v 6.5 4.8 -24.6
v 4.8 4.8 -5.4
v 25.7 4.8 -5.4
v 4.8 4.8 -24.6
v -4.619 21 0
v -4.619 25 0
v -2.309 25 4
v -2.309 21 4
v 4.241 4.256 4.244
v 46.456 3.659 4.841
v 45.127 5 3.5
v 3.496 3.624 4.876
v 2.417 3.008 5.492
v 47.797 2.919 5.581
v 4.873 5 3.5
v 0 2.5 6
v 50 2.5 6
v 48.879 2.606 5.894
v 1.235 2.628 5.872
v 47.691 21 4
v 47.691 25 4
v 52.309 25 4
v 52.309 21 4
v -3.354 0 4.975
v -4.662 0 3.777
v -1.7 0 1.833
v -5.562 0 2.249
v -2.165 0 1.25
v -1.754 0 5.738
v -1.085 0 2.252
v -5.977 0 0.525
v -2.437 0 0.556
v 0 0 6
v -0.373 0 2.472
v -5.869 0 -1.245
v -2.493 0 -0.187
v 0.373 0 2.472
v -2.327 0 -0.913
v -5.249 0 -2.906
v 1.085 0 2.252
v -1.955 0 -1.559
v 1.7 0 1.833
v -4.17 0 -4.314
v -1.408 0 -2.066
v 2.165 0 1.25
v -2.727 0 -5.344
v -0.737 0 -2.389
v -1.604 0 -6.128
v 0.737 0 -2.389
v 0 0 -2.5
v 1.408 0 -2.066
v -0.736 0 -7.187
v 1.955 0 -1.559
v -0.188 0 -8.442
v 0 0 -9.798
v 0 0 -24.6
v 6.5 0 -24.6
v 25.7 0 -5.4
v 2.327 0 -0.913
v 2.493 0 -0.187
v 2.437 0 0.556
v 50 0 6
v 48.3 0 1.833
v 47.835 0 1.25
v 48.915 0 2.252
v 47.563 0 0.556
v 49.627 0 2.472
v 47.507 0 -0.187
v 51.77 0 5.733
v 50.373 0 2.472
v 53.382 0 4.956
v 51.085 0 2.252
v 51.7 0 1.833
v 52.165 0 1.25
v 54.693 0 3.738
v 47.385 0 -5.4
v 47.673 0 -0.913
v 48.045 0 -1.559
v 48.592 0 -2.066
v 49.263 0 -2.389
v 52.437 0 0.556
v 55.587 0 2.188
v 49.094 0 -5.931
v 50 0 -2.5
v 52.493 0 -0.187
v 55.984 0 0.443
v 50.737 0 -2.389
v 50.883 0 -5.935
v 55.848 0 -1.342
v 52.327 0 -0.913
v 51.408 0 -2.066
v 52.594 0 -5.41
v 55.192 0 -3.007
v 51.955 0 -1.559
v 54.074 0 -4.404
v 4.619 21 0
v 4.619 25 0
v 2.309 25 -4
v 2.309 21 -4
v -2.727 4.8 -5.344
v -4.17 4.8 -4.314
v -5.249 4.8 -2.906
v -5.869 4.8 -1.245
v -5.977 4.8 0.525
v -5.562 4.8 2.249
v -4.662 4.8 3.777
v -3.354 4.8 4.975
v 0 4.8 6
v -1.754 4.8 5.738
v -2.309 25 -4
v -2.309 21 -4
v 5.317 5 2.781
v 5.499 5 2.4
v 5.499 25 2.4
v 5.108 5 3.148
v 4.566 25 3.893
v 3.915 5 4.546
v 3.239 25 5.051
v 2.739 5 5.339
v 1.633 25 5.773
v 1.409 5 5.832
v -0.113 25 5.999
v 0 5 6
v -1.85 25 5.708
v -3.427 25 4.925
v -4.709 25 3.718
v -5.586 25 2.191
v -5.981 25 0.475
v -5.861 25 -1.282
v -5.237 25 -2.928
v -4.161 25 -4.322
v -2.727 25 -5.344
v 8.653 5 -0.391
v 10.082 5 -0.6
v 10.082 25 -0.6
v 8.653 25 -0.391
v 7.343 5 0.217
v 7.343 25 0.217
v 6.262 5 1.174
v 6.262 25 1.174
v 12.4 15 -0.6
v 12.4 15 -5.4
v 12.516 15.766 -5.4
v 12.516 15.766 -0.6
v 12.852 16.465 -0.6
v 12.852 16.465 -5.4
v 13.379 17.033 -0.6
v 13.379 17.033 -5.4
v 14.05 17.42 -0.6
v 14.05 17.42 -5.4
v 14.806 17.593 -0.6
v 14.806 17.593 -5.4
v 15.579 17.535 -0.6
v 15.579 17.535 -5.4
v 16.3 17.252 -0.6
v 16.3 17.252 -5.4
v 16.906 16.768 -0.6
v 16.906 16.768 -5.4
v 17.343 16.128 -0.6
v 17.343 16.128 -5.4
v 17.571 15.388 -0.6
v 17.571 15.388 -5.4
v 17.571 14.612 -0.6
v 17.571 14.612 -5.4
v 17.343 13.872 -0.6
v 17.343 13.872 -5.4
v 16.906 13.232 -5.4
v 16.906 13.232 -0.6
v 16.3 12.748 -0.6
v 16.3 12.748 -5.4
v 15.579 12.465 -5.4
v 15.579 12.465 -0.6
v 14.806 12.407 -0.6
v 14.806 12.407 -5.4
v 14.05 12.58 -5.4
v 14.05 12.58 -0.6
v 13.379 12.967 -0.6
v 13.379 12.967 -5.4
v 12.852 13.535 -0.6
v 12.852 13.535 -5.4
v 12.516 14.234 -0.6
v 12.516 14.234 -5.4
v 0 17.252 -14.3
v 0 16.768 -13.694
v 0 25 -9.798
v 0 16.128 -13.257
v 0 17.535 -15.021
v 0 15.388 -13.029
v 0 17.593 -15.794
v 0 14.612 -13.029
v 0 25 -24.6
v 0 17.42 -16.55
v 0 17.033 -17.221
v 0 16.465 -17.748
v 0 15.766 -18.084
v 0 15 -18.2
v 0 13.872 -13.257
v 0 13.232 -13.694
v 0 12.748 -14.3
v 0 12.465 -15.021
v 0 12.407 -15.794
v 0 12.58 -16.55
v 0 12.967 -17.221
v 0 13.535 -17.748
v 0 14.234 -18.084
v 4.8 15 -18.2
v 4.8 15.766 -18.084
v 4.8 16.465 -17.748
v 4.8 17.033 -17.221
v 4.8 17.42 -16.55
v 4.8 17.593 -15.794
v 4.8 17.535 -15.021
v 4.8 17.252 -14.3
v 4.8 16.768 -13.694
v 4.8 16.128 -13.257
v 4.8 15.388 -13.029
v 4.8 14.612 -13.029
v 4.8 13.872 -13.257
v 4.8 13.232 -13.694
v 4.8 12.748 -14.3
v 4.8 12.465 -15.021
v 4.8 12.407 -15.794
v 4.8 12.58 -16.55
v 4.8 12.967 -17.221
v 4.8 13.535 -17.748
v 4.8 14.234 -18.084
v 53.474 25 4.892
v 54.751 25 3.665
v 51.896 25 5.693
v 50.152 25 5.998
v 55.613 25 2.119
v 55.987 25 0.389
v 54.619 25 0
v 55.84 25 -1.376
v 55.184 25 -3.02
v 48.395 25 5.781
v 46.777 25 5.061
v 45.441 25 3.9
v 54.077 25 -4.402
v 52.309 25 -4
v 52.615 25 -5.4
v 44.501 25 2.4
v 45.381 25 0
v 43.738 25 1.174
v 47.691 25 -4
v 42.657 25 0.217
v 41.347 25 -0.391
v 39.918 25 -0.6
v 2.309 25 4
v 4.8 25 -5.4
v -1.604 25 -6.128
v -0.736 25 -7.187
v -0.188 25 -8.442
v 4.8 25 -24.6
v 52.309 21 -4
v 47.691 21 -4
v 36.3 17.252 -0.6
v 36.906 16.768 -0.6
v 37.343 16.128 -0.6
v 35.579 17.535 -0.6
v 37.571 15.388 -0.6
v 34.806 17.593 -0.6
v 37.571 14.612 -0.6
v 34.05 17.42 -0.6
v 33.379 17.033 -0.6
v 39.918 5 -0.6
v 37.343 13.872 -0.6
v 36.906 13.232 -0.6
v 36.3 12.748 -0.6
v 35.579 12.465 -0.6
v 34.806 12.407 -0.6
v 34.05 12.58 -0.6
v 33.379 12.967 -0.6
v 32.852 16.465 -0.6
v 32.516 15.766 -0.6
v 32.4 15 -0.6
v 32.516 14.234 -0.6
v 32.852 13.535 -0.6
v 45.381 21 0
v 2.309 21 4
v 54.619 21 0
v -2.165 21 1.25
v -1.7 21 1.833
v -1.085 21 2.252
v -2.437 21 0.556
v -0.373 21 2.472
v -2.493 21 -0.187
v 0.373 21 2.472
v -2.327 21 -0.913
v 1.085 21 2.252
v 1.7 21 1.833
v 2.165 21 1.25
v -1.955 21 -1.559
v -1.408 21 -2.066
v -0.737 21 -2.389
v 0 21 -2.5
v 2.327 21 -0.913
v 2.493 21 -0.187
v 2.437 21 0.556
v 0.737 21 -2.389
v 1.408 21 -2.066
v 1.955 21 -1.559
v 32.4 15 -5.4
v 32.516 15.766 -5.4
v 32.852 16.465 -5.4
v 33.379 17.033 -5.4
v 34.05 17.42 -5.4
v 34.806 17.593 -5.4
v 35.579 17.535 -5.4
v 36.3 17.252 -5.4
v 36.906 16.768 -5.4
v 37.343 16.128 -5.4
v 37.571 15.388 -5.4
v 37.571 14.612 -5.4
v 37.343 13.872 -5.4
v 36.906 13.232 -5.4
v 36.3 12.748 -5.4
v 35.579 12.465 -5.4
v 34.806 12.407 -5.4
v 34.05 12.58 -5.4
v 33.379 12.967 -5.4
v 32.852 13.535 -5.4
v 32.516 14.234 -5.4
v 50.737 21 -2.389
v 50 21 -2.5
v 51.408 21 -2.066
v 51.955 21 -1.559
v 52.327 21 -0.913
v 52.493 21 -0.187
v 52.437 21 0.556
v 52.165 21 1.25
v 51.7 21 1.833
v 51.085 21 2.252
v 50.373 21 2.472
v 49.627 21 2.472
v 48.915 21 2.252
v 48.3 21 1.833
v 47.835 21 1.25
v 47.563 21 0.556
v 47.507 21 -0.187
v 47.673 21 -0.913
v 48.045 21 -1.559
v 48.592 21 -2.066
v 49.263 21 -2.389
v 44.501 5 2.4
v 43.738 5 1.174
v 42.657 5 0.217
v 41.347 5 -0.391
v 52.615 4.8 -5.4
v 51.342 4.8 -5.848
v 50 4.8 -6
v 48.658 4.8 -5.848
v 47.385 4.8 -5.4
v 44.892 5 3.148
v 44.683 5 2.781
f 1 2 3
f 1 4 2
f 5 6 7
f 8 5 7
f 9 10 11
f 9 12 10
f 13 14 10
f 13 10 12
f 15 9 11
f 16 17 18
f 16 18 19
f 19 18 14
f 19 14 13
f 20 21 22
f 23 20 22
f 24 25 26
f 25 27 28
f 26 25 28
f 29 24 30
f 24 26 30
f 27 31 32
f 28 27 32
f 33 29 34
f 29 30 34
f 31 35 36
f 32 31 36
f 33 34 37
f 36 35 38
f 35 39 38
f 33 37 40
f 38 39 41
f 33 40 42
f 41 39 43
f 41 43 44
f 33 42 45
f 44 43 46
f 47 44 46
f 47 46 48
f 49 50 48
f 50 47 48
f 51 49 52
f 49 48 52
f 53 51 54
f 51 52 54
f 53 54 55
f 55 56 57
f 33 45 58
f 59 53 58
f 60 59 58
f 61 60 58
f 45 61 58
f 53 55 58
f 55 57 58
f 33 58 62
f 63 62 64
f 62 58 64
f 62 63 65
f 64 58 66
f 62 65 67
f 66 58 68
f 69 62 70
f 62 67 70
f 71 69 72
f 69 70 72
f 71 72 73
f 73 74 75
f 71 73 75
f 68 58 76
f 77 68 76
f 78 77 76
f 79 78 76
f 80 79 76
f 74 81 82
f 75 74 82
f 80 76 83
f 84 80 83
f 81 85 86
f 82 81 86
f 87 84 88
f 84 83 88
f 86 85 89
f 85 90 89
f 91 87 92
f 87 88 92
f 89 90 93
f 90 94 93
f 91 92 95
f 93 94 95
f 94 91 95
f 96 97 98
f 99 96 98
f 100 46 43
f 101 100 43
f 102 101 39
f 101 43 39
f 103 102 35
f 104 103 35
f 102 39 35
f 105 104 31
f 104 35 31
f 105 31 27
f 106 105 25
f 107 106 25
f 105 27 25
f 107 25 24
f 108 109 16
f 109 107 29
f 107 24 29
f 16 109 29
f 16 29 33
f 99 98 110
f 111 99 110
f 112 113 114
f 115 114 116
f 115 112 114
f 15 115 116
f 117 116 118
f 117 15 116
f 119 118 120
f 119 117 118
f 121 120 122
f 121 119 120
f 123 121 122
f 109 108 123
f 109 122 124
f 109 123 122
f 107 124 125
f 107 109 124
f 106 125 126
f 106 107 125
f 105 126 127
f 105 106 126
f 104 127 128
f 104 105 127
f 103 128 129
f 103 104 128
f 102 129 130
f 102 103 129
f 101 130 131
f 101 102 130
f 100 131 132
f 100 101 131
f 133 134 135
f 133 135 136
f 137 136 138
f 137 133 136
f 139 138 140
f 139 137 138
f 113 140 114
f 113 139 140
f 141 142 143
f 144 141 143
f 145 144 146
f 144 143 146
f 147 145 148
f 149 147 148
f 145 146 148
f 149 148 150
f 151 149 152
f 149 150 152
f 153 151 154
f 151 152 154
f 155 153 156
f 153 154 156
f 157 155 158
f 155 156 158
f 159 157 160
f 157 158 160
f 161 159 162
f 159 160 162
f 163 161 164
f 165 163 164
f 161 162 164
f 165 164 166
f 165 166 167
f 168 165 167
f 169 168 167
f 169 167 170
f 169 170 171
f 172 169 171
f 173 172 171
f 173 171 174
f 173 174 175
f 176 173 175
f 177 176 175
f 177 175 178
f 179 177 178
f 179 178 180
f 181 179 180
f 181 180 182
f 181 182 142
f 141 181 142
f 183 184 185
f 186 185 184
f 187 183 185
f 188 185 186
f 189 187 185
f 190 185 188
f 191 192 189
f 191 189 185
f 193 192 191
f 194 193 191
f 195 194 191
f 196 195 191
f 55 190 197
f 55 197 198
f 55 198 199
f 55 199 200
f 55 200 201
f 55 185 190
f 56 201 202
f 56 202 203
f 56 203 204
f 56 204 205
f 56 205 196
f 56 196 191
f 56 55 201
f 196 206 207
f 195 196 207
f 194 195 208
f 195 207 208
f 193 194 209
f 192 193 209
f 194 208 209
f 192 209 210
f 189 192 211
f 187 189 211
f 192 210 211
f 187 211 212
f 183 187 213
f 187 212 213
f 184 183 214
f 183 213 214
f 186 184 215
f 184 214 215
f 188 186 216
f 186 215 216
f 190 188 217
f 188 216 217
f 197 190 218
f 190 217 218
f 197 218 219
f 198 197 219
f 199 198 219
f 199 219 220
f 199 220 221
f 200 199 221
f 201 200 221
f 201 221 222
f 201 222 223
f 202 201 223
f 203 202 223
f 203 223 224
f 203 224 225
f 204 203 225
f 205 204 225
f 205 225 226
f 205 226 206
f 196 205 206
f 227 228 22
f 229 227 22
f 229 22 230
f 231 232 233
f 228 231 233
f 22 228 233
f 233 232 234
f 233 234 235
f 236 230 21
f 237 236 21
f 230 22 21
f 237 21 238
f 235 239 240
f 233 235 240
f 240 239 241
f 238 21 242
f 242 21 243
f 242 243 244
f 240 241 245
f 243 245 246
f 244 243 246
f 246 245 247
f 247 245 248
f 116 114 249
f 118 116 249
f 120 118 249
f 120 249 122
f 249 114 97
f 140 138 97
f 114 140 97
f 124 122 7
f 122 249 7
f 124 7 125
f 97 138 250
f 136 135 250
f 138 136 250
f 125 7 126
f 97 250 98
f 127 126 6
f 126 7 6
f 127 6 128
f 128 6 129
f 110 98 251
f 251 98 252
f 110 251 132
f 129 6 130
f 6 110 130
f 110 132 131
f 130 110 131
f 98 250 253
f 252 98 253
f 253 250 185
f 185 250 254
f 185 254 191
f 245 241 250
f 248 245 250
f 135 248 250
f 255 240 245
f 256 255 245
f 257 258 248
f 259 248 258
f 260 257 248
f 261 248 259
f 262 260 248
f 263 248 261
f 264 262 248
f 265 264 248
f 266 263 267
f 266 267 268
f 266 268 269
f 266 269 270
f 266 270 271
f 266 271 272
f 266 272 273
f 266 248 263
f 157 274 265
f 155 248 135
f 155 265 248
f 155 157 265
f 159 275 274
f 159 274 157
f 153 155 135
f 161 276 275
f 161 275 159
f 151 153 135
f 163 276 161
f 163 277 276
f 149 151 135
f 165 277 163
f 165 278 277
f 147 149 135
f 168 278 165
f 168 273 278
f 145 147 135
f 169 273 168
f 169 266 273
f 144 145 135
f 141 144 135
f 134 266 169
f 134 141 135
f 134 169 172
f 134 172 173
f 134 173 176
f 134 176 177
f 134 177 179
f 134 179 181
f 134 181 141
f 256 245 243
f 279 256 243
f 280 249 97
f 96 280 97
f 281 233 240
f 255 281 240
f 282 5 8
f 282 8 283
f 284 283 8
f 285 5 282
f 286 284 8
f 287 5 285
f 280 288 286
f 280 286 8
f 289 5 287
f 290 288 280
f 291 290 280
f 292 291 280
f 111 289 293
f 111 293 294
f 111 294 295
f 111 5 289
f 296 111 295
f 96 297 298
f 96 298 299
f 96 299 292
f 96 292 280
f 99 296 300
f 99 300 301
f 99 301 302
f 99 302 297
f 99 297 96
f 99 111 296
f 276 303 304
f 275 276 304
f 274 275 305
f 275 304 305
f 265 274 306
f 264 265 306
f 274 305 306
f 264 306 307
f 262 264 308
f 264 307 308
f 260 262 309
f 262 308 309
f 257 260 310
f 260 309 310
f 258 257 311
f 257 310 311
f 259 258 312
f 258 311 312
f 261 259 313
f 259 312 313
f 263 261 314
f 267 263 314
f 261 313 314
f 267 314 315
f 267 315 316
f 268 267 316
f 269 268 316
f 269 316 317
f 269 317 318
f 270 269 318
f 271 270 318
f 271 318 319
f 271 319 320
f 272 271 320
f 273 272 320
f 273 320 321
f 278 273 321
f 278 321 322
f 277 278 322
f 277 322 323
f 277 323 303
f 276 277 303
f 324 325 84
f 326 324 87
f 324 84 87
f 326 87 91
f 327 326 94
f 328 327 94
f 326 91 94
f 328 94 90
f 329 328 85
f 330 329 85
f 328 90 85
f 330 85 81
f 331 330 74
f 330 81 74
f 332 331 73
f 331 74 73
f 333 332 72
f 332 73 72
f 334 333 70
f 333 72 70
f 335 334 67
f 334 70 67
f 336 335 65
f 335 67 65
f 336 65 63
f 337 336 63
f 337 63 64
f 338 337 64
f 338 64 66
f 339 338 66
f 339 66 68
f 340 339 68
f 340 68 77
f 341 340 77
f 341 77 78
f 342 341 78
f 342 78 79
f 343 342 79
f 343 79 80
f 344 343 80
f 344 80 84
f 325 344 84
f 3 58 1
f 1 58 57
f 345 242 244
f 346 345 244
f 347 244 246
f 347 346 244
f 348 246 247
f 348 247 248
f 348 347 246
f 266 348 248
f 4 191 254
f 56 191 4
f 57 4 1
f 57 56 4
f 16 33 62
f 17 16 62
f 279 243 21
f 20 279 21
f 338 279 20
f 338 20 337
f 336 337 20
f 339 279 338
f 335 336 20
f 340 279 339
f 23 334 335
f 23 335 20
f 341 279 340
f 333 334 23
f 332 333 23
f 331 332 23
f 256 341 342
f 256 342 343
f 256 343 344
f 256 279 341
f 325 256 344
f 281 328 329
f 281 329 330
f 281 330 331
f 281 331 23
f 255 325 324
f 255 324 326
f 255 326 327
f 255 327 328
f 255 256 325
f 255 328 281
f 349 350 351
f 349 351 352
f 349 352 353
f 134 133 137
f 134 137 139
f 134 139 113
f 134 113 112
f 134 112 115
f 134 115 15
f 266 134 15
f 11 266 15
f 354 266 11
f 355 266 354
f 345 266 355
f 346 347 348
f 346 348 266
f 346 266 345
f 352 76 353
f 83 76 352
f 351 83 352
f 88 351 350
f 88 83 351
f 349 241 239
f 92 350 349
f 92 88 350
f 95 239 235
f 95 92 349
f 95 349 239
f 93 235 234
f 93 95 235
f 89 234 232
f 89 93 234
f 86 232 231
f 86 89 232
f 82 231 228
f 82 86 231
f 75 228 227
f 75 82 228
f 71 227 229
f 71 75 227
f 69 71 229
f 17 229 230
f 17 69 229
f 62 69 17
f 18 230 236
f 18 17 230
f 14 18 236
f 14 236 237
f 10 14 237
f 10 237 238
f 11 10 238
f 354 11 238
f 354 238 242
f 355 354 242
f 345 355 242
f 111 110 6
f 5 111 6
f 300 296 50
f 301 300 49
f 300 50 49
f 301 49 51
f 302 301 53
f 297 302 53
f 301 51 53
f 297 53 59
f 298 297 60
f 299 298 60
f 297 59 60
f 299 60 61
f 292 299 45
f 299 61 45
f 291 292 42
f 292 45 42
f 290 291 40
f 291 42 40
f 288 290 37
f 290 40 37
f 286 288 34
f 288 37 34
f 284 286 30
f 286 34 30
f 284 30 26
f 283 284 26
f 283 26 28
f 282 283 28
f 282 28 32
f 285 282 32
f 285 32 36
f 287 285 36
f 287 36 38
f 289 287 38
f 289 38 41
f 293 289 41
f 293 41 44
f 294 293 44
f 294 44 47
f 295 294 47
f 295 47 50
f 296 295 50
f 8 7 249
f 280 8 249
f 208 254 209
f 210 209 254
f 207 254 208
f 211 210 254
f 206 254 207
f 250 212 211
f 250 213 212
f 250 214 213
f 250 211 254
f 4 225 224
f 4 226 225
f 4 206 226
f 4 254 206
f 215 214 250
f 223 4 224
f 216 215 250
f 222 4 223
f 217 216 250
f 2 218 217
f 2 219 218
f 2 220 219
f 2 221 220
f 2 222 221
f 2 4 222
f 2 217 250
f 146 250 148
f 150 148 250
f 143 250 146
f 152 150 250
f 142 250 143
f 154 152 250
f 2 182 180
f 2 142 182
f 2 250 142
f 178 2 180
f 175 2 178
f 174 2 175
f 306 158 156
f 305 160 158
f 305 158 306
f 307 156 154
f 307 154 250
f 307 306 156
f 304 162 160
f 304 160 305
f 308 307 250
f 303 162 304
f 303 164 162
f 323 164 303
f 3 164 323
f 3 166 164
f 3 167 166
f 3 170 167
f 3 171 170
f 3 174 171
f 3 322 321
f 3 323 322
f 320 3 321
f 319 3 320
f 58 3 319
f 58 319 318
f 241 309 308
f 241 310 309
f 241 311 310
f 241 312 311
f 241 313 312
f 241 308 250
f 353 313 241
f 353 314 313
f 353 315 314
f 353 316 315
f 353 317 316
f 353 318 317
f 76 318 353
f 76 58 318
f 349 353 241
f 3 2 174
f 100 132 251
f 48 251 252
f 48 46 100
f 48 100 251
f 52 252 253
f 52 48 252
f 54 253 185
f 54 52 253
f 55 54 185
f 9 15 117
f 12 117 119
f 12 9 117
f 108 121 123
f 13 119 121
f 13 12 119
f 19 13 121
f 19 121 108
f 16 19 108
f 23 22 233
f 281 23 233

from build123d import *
from build123d.topology import SkipClean

# Parameters (mm, degrees)
BOSS_EXTRUDE1_DEPTH = 4.8
BOSS_EXTRUDE2_DEPTH = 20.2
BOSS_EXTRUDE3_DEPTH = 0.2
CHAMFER1_SIZE       = 2.5
SKETCH4_R           = 2.5
CUT_EXTRUDE1_DEPTH  = 67.076924868
CUT_EXTRUDE2_DEPTH  = 4
SKETCH6_R           = 2.6
CUT_EXTRUDE3_DEPTH  = 65.262275092
SKETCH7_R           = 2.6
CUT_EXTRUDE4_DEPTH  = 63.061260058


with BuildPart() as part:
    # Sketch1 → Boss-Extrude1 (new body)
    with BuildSketch(Plane(origin=(0, 0, 0), x_dir=(1, 0, 0), z_dir=(0, 1, 0))):
        with BuildLine():
            Line((0, -6), (50, -6))
            ThreePointArc((50, -6), (55.848076607, 1.341640786), (47.384660634, 5.4))
            Line((47.384660634, 5.4), (25.7, 5.4))
            Line((25.7, 5.4), (6.5, 24.6))
            Line((6.5, 24.6), (0, 24.6))
            Line((0, 24.6), (0, 9.797958971))
            ThreePointArc((0, 9.797958971), (-0.735985673, 7.186794132), (-2.727272727, 5.344341257))
            ThreePointArc((-2.727272727, 5.344341257), (-5.833782973, -1.402489297), (0, -6))
        make_face()
    extrude(amount=BOSS_EXTRUDE1_DEPTH)

    # Sketch2 → Boss-Extrude2 (add)
    with SkipClean():  # the faces are left unmerged after this step: merging them gives an invalid solid
        with BuildSketch(Plane(origin=(0, 4.8, 0), x_dir=(1, 0, 0), z_dir=(0, 1, 0))):
            with BuildLine():
                Line((0, 24.6), (4.8, 24.6))
                Line((4.8, 24.6), (4.8, 5.4))
                Line((4.8, 5.4), (52.615339366, 5.4))
                ThreePointArc((52.615339366, 5.4), (54.158005006, -4.325620692), (44.500909166, -2.4))
                ThreePointArc((44.500909166, -2.4), (42.656946259, -0.216699867), (39.918333471, 0.6))
                Line((39.918333471, 0.6), (10.081666529, 0.6))
                ThreePointArc((10.081666529, 0.6), (7.343053741, -0.216699867), (5.499090834, -2.4))
                ThreePointArc((5.499090834, -2.4), (-4.112717992, -4.368701262), (-2.727272727, 5.344341257))
                ThreePointArc((-2.727272727, 5.344341257), (-0.735985673, 7.186794132), (0, 9.797958971))
                Line((0, 9.797958971), (0, 24.6))
            make_face()
        extrude(amount=BOSS_EXTRUDE2_DEPTH)

    # Sketch3 → Boss-Extrude3 (add)
    with SkipClean():  # the faces are left unmerged after this step: merging them gives an invalid solid
        with BuildSketch(Plane(origin=(0, 4.8, 0), x_dir=(1, 0, 0), z_dir=(0, 1, 0))):
            with BuildLine():
                Line((39.918333471, 0.6), (10.081666529, 0.6))
                ThreePointArc((10.081666529, 0.6), (7.343053741, -0.216699867), (5.499090834, -2.4))
                ThreePointArc((5.499090834, -2.4), (3.286335345, -5.019960159), (0, -6))
                Line((0, -6), (50, -6))
                ThreePointArc((50, -6), (46.713664655, -5.019960159), (44.500909166, -2.4))
                ThreePointArc((44.500909166, -2.4), (42.656946259, -0.216699867), (39.918333471, 0.6))
            make_face()
        extrude(amount=BOSS_EXTRUDE3_DEPTH)

    # Chamfer1
    # the kernel refuses this chamfer: 2.5 mm, written as the material it takes off along each edge
    with BuildSketch(Plane(origin=(-6.42920747, 5, 6), x_dir=(0, -0.9996219169112968, 0.027495876610586317), z_dir=(1, 0, 0))) as chamfer1_piece_1_section:
        Polygon((CHAMFER1_SIZE * 0.999621916911, CHAMFER1_SIZE * 0.0274958766106), (-CHAMFER1_SIZE * 0.0274958766106, CHAMFER1_SIZE * 0.999621916911), (0, 0), align=None)
    chamfer1_piece_1 = extrude(amount=62.85841494, mode=Mode.PRIVATE)
    chamfer1_piece_1 = chamfer1_piece_1 - Plane(origin=(0, 4.144274293, 0), x_dir=(0.9165151389911681, 0, 0.3999999999999999), z_dir=(0, -1, 0)) * Cylinder(6, 136, mode=Mode.PRIVATE)
    chamfer1_piece_1 = chamfer1_piece_1 - Plane(origin=(50, 4.144274293, 0), x_dir=(0.43588989435406716, 0, -0.9000000000000001), z_dir=(0, -1, 0)) * Cylinder(6, 136, mode=Mode.PRIVATE)
    add(chamfer1_piece_1, mode=Mode.SUBTRACT)

    # Sketch4 → Cut-Extrude1 (cut, through all)
    with BuildSketch(Plane.XZ):
        with Locations(Location((0, 0, 0), (0, 0, 270))):
            Circle(SKETCH4_R)
        with Locations(Location((50, 0, 0), (0, 0, 270))):
            Circle(SKETCH4_R)
    extrude(amount=-CUT_EXTRUDE1_DEPTH, mode=Mode.SUBTRACT)

    # Sketch5 → Cut-Extrude2 (cut)
    with BuildSketch(Plane(origin=(0, 25, 0), x_dir=(1, 0, 0), z_dir=(0, 1, 0))):
        Polygon((4.618802154, 0), (2.309401077, 4), (-2.309401077, 4), (-4.618802154, 0), (-2.309401077, -4), (2.309401077, -4), align=None)
        Polygon((47.690598923, 4), (45.381197846, 0), (47.690598923, -4), (52.309401077, -4), (54.618802154, 0), (52.309401077, 4), align=None)
    extrude(amount=-CUT_EXTRUDE2_DEPTH, mode=Mode.SUBTRACT)

    # Sketch6 → Cut-Extrude3 (cut, through all)
    with BuildSketch(Plane(origin=(0, 0, -5.4), x_dir=(-1, 0, 0), z_dir=(0, 0, -1))):
        with Locations((-35, 15)):
            Circle(SKETCH6_R)
        with Locations((-15, 15)):
            Circle(SKETCH6_R)
    extrude(amount=-CUT_EXTRUDE3_DEPTH, mode=Mode.SUBTRACT)

    # Sketch7 → Cut-Extrude4 (cut, through all)
    with BuildSketch(Plane(origin=(4.8, 0, 0), x_dir=(0, 0, -1), z_dir=(1, 0, 0))):
        with Locations((15.6, 15)):
            Circle(SKETCH7_R)
    extrude(amount=-CUT_EXTRUDE4_DEPTH, mode=Mode.SUBTRACT)


solid = part.part
